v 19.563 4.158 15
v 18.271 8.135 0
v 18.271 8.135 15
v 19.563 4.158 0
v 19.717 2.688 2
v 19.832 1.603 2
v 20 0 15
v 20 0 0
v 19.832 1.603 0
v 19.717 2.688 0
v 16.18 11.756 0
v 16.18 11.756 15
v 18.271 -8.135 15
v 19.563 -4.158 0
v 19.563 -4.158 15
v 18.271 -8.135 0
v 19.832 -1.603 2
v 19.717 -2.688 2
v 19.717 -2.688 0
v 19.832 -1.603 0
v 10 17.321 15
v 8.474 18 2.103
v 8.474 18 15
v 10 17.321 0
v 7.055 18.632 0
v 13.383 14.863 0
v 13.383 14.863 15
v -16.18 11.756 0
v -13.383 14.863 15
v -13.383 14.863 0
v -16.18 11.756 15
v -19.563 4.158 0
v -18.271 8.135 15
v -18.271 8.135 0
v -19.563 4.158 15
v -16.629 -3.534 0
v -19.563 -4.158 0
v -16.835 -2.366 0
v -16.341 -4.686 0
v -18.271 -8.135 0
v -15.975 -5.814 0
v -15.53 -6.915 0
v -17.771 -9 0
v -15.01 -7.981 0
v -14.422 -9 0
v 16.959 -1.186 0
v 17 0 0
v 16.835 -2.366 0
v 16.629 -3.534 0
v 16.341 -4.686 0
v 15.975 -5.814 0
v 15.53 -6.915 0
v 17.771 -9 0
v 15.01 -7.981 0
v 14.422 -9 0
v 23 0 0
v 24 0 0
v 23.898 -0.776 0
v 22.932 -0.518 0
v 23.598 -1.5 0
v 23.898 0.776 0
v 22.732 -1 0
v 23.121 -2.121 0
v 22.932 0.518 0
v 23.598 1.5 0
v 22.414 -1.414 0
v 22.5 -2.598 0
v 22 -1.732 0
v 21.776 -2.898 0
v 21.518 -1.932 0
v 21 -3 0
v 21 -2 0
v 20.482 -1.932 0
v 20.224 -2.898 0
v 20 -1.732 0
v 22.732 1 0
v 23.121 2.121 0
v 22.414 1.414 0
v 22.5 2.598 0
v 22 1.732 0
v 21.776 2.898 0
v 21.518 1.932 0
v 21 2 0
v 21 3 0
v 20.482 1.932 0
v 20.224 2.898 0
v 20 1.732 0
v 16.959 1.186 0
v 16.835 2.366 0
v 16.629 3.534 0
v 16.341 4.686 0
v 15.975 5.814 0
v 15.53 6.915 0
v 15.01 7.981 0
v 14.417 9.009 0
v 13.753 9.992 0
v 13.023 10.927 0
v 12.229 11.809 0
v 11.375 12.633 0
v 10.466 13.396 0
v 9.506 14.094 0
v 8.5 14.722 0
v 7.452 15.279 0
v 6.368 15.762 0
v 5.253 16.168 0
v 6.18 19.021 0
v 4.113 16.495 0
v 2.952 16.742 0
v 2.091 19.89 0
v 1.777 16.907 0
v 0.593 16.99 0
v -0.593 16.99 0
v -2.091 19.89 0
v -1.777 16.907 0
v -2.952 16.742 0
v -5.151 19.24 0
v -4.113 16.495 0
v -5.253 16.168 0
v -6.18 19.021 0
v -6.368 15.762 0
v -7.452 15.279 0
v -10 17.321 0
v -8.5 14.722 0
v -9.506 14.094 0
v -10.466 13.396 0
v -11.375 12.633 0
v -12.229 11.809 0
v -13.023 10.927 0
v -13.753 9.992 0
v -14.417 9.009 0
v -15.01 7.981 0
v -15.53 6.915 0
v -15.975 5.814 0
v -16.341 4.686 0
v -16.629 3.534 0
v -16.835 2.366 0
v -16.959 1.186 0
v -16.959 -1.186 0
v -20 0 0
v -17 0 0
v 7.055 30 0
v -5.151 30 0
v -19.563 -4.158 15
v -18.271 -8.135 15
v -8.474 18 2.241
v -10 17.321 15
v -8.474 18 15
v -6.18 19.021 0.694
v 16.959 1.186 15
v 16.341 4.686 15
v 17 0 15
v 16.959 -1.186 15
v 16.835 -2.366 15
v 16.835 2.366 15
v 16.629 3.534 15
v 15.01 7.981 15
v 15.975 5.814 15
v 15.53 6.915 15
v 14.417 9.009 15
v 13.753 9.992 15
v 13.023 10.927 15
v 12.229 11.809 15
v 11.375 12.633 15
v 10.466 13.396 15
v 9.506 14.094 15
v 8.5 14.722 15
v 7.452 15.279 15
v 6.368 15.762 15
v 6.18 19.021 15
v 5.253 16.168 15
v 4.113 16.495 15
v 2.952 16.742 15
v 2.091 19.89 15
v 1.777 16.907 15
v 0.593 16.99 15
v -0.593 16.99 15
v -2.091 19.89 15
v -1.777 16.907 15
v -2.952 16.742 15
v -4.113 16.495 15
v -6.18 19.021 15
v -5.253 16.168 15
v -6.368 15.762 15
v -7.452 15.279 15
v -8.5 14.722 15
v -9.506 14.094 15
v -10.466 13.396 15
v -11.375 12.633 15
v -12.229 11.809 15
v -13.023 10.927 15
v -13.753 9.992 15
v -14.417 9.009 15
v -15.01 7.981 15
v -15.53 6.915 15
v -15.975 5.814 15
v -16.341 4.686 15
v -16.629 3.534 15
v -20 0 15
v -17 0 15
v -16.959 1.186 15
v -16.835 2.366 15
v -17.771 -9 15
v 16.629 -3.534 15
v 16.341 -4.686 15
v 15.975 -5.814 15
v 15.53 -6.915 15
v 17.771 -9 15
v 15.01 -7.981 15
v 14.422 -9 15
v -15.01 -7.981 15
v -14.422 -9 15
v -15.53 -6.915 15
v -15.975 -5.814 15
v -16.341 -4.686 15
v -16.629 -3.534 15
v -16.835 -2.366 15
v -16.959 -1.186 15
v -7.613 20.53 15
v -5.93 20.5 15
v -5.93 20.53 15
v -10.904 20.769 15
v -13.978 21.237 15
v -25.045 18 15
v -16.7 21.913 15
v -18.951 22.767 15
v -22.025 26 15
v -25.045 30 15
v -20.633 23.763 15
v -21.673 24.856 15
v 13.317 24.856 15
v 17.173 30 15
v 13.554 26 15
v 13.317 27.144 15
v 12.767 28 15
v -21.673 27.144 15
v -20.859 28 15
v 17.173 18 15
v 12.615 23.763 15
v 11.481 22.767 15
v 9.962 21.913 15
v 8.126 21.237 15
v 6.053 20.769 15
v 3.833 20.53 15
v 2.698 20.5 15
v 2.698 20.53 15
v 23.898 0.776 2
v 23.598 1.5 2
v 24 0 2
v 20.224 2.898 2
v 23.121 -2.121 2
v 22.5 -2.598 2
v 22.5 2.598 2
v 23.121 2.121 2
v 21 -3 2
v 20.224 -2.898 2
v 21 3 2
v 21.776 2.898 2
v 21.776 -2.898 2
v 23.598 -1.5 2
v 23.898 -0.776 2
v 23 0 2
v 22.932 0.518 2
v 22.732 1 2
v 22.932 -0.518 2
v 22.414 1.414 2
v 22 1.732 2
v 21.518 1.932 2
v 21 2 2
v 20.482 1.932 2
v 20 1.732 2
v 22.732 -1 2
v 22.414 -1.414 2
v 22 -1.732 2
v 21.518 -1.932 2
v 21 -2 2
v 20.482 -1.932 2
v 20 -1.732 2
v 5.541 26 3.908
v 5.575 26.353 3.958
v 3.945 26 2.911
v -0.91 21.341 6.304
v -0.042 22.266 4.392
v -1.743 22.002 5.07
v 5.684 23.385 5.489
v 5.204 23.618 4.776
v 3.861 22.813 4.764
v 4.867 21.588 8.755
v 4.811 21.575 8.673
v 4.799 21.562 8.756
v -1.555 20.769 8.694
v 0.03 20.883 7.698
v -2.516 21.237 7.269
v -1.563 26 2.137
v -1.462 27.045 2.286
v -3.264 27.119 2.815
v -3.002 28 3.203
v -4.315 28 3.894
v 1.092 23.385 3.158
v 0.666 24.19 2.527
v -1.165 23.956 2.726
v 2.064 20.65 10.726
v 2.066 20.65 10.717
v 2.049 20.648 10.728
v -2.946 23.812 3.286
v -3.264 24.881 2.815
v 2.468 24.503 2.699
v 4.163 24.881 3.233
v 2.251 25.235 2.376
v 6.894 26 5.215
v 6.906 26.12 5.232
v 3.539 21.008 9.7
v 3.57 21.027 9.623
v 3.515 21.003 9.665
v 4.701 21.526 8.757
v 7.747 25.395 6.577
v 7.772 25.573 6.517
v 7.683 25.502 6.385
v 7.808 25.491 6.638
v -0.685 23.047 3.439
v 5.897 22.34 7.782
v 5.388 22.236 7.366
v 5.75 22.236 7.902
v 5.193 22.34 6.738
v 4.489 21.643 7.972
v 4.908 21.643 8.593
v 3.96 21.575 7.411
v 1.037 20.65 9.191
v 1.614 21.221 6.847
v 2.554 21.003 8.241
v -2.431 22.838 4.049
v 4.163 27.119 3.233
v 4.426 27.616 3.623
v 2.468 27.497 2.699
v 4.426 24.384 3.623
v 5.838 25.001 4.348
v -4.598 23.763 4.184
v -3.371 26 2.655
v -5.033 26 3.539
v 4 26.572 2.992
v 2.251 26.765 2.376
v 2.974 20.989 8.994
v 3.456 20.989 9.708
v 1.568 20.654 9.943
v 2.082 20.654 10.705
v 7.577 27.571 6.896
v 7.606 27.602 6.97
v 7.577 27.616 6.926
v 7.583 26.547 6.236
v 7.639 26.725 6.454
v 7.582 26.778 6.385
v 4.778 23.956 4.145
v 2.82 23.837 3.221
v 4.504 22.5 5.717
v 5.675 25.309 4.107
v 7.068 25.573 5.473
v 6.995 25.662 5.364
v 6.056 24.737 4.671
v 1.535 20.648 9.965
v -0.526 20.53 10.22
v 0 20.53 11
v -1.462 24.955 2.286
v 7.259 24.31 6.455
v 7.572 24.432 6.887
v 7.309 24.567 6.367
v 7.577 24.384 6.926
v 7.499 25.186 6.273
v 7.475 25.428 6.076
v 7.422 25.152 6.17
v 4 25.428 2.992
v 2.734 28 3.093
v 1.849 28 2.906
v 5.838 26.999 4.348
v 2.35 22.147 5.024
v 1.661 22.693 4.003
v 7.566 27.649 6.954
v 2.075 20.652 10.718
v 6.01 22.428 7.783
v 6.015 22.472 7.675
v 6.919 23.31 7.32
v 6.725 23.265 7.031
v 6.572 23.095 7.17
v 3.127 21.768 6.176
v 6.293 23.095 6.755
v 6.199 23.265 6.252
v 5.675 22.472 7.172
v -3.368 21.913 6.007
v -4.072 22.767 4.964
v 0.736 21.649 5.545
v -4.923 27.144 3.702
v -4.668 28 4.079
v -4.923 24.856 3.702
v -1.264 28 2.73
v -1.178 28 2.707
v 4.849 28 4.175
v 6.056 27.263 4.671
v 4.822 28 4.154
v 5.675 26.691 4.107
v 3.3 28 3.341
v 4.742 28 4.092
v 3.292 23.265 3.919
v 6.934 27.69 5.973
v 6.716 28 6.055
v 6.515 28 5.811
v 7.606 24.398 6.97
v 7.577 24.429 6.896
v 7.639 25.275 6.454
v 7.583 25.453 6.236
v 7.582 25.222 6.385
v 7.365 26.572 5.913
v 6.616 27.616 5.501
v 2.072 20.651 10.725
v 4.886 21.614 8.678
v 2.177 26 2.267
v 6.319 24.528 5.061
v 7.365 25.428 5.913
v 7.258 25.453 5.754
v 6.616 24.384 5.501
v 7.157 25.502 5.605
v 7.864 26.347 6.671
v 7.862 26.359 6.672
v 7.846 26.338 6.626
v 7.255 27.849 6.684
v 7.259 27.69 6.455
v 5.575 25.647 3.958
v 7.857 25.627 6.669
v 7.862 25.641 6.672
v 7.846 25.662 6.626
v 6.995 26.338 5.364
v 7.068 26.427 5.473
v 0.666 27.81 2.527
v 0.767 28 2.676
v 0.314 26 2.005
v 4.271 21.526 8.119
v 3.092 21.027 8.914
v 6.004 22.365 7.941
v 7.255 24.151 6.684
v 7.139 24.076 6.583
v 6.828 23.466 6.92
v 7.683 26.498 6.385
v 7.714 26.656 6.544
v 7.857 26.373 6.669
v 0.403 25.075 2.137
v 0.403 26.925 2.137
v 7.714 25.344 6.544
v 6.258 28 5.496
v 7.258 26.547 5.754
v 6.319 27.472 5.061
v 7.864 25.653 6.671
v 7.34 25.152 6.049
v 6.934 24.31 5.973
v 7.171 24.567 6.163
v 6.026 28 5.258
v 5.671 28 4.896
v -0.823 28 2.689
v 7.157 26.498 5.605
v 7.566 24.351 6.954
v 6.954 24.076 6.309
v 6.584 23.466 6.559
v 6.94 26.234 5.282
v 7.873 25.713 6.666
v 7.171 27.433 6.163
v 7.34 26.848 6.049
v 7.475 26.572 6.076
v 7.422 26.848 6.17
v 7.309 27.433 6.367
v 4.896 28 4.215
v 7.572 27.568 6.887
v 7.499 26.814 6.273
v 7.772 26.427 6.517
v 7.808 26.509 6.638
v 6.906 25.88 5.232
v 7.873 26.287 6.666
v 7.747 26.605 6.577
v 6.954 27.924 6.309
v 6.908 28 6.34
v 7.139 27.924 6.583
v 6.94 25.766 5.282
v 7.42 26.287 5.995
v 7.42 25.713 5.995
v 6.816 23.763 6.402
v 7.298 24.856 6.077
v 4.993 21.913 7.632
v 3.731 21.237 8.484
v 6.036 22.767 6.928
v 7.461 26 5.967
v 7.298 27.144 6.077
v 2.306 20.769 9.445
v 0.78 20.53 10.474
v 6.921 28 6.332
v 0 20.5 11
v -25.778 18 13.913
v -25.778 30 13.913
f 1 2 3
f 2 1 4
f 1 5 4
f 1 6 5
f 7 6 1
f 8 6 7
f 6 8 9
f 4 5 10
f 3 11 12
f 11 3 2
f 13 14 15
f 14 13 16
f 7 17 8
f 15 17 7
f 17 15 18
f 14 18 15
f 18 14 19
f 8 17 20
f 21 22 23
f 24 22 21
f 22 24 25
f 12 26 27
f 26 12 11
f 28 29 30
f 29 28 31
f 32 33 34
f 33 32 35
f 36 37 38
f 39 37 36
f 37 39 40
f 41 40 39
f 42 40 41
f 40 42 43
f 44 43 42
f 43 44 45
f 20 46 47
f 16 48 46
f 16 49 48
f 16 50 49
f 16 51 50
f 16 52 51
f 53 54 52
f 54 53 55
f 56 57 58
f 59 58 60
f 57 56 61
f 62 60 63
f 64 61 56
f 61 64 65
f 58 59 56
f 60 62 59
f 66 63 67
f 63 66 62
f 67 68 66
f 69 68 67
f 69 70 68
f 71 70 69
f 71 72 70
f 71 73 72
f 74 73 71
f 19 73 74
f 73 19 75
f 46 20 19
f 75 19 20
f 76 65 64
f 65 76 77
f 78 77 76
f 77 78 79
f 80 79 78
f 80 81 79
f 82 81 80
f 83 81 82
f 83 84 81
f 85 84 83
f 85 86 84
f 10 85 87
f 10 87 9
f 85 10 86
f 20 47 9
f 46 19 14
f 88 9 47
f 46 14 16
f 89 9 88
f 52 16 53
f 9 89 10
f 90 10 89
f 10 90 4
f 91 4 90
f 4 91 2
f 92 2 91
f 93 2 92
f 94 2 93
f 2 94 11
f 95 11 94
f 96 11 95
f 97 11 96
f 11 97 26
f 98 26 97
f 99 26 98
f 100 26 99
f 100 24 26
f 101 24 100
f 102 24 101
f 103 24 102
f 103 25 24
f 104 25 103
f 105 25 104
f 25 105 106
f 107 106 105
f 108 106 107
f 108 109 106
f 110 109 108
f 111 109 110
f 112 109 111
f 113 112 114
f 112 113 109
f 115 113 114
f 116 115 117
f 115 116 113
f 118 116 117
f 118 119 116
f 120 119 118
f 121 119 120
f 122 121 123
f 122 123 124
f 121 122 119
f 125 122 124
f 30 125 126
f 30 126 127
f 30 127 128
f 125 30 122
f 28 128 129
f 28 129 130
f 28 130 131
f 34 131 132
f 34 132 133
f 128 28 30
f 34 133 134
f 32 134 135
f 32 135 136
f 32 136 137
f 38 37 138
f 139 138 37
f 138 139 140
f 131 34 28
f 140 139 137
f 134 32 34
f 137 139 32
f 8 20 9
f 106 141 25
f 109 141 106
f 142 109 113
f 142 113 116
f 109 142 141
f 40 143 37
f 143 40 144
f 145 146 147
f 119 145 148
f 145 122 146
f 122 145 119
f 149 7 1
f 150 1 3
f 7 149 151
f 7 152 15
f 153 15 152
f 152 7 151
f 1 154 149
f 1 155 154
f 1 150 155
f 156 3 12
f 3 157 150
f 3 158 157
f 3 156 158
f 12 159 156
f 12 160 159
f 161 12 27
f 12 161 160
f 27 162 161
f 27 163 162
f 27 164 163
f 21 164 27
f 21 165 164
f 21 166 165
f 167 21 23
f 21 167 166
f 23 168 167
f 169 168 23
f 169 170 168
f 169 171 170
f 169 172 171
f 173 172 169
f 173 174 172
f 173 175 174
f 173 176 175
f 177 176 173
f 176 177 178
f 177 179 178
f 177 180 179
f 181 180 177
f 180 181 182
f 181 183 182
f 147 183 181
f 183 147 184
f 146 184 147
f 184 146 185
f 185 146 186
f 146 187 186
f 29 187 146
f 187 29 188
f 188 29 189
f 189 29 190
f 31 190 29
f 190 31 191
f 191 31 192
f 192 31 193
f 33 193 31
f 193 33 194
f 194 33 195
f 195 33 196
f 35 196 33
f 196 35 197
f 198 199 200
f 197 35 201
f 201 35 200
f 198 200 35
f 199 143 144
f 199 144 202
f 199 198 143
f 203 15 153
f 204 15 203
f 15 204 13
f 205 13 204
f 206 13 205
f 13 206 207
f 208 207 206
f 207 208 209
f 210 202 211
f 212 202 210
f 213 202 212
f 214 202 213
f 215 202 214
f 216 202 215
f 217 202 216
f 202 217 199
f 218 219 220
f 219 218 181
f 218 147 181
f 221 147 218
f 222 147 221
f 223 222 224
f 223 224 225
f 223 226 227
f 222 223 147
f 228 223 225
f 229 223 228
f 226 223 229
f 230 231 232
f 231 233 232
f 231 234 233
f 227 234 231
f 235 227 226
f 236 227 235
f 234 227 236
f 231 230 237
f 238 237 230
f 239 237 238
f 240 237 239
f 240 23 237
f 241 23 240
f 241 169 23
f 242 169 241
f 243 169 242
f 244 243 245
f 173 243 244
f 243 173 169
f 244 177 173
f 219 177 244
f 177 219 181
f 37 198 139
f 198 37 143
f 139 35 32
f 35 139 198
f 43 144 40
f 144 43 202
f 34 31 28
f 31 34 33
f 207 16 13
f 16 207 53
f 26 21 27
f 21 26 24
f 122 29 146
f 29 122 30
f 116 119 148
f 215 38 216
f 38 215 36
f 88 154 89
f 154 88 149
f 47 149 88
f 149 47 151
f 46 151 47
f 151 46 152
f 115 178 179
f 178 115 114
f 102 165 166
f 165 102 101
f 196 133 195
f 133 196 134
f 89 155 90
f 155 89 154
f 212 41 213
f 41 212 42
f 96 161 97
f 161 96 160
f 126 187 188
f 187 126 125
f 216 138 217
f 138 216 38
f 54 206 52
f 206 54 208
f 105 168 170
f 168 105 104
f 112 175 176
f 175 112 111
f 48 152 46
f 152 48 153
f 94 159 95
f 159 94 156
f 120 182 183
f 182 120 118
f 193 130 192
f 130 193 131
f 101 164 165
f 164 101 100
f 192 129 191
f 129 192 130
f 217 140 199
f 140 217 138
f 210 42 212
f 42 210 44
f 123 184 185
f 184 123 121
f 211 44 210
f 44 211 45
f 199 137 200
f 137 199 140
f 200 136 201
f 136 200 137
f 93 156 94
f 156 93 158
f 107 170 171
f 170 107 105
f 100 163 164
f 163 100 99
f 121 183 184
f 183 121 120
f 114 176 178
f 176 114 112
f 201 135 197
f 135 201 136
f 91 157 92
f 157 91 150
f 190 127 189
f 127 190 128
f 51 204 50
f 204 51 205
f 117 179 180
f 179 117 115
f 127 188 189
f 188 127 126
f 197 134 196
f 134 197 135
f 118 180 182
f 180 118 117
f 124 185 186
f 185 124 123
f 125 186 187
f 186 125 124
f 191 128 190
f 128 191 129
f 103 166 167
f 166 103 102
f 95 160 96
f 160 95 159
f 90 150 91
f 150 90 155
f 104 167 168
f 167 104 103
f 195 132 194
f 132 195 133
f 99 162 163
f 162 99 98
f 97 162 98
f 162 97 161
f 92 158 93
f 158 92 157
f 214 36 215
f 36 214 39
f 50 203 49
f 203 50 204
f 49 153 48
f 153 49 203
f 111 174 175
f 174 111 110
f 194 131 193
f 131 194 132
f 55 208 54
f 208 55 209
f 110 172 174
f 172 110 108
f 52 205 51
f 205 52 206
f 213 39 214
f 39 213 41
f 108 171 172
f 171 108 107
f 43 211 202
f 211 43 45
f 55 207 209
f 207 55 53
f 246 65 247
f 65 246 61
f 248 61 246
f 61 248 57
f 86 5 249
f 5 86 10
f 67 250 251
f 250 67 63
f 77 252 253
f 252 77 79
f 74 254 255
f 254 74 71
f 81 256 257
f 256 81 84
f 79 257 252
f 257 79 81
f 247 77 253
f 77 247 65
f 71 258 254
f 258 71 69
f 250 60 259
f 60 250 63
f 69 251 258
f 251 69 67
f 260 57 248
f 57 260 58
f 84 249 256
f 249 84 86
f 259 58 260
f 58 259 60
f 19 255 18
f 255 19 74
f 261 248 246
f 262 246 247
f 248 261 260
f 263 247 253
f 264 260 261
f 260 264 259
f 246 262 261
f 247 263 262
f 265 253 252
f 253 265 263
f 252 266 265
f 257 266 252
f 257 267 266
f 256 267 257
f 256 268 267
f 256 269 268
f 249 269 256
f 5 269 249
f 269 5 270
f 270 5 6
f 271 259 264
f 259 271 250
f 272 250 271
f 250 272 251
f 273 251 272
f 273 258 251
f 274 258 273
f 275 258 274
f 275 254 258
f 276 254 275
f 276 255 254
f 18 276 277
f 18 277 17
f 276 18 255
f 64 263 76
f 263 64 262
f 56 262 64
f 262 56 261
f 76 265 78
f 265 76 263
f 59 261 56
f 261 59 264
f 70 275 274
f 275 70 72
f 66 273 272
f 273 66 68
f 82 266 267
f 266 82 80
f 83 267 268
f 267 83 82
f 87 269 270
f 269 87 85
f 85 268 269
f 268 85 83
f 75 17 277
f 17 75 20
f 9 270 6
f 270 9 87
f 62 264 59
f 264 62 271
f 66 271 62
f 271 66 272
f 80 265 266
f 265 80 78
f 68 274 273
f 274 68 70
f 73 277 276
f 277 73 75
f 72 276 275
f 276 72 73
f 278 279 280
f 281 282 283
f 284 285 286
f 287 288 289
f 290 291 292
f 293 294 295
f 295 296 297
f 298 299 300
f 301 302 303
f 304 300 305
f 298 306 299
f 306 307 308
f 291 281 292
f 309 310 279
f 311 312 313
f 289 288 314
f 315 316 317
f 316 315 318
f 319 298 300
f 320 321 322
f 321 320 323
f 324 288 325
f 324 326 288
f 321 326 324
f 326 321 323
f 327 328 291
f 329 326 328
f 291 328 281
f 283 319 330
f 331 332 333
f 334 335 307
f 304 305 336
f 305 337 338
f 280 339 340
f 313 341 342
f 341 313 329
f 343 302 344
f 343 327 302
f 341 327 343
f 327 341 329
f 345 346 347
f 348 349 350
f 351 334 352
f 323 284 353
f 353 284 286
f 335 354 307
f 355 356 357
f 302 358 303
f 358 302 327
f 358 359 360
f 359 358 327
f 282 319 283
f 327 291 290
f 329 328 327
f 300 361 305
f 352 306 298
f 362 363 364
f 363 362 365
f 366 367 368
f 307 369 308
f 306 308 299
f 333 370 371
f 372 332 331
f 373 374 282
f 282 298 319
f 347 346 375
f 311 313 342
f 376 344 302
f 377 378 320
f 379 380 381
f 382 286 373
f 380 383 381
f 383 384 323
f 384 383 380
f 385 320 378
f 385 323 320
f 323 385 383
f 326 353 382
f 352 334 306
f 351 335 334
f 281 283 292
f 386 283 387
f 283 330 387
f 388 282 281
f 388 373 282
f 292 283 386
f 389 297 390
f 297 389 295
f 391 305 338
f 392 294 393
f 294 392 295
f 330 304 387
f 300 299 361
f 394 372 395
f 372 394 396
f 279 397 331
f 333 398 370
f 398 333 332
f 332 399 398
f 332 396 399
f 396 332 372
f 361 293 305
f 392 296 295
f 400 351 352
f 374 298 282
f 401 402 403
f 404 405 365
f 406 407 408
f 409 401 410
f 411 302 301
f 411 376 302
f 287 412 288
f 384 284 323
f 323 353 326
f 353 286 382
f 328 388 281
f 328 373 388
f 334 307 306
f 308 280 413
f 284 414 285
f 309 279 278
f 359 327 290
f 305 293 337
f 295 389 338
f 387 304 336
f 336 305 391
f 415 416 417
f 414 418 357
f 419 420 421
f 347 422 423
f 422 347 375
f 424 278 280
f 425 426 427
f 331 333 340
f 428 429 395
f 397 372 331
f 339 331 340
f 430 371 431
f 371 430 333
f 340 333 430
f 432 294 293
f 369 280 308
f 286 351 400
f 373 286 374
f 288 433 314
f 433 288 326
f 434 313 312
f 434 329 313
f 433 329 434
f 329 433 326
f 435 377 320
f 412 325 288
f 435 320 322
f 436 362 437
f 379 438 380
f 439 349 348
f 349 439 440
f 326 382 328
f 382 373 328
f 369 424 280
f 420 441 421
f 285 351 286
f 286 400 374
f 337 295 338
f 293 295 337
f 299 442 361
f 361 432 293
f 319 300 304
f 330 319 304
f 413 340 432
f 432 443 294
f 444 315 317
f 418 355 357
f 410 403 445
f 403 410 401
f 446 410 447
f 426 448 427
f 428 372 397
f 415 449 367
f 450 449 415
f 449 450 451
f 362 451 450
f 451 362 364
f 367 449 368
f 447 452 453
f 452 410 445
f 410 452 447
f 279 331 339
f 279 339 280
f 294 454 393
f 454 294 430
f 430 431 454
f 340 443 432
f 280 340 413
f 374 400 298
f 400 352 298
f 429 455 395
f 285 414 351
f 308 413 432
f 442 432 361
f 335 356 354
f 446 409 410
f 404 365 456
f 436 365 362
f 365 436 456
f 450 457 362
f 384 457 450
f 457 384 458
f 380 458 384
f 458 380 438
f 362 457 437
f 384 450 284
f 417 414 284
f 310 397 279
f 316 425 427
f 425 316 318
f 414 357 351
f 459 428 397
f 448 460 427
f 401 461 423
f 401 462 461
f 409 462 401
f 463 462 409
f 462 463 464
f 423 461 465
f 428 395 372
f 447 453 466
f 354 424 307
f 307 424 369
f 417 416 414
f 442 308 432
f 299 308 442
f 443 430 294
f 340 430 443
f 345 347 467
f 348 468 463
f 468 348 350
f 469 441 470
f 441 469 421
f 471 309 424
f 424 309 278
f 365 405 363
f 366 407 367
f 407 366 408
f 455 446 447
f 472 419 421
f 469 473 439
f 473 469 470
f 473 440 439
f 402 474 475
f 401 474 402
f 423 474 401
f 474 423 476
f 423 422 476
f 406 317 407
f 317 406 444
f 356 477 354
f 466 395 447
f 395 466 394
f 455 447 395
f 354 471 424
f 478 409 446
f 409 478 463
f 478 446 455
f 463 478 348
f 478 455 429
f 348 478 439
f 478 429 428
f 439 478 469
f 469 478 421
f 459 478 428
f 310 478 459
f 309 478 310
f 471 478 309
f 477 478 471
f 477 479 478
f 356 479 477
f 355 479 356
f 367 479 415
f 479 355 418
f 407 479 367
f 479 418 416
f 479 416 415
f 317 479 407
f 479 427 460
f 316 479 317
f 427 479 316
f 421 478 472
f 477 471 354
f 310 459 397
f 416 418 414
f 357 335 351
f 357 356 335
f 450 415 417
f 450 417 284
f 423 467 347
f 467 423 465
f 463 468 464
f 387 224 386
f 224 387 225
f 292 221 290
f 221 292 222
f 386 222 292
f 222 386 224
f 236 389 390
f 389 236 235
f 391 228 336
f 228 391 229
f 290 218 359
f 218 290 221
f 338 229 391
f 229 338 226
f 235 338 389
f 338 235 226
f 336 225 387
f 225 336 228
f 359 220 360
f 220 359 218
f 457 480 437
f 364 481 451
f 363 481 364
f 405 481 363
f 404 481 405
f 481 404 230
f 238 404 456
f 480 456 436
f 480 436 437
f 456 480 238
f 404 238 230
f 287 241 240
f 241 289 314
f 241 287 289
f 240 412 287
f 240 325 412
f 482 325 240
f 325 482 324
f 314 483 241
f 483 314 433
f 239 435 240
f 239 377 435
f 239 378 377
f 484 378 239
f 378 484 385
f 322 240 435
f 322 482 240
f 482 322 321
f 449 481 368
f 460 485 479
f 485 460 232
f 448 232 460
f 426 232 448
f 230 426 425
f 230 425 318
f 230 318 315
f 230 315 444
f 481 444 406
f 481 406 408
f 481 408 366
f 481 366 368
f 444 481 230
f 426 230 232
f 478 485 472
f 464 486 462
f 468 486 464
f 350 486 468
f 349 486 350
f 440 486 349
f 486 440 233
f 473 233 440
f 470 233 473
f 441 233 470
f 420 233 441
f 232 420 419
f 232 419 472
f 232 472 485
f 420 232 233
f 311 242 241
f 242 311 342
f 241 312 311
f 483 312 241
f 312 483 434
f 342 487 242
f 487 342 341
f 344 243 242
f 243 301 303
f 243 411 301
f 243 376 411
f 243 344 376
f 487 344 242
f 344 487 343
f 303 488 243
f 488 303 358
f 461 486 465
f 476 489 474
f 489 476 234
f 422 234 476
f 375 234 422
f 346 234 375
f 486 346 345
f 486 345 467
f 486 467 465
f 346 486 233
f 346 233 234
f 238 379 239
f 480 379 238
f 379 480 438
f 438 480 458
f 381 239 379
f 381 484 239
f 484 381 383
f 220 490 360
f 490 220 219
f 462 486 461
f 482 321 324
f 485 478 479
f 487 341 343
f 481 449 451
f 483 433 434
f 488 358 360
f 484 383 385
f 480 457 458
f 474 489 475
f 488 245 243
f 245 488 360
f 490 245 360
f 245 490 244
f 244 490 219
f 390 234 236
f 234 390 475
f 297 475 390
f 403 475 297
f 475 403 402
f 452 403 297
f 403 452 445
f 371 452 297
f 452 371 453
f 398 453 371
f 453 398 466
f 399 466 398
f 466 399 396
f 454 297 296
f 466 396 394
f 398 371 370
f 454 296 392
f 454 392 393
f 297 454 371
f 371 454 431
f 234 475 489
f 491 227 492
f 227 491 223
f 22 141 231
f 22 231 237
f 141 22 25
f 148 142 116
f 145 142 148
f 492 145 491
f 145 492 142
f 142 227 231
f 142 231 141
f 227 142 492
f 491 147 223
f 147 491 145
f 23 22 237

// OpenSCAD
r = 17;
dr = 3;
h = 15;

module clip () {
difference(){
    cylinder(h=h,r=r+dr);
    translate([0,0,-1]) cylinder(h=h+2,r=r,$fn=90);
    translate([0,-17-2,2]) cube([40,20,2*h+2],true);
}
translate([r+dr+1,0,0])
    difference() {
        cylinder(h=2,r=3,$fn=24);
        translate([0,0,-1])cylinder(h=4,r=2,$fn=24);
    }
}

module tablet () {
    difference() {
        scale(.5)scale([1.8,1.1,1.8]) {
            sphere(10);
            cylinder(30, r=10);
            rotate([0,90,0]) { cylinder(30, r=10); }
            translate([0,-10,0]) { cube([30,20,30]); }
        }
        translate([-20,2,-20]) { cube([80,15,80]); }
    }
}

module socket () {
    rotate([0,-56,0]) {
        difference() {
            translate([-12,-8,-12]) { cube([35,12,35]); }
            tablet();
        }
    }
}

clip();
difference() {
    translate([0,r+9,11]) socket();
    translate([-10,15,-20]) cube(20);
    translate([-30,0,h]) cube(55);
}
